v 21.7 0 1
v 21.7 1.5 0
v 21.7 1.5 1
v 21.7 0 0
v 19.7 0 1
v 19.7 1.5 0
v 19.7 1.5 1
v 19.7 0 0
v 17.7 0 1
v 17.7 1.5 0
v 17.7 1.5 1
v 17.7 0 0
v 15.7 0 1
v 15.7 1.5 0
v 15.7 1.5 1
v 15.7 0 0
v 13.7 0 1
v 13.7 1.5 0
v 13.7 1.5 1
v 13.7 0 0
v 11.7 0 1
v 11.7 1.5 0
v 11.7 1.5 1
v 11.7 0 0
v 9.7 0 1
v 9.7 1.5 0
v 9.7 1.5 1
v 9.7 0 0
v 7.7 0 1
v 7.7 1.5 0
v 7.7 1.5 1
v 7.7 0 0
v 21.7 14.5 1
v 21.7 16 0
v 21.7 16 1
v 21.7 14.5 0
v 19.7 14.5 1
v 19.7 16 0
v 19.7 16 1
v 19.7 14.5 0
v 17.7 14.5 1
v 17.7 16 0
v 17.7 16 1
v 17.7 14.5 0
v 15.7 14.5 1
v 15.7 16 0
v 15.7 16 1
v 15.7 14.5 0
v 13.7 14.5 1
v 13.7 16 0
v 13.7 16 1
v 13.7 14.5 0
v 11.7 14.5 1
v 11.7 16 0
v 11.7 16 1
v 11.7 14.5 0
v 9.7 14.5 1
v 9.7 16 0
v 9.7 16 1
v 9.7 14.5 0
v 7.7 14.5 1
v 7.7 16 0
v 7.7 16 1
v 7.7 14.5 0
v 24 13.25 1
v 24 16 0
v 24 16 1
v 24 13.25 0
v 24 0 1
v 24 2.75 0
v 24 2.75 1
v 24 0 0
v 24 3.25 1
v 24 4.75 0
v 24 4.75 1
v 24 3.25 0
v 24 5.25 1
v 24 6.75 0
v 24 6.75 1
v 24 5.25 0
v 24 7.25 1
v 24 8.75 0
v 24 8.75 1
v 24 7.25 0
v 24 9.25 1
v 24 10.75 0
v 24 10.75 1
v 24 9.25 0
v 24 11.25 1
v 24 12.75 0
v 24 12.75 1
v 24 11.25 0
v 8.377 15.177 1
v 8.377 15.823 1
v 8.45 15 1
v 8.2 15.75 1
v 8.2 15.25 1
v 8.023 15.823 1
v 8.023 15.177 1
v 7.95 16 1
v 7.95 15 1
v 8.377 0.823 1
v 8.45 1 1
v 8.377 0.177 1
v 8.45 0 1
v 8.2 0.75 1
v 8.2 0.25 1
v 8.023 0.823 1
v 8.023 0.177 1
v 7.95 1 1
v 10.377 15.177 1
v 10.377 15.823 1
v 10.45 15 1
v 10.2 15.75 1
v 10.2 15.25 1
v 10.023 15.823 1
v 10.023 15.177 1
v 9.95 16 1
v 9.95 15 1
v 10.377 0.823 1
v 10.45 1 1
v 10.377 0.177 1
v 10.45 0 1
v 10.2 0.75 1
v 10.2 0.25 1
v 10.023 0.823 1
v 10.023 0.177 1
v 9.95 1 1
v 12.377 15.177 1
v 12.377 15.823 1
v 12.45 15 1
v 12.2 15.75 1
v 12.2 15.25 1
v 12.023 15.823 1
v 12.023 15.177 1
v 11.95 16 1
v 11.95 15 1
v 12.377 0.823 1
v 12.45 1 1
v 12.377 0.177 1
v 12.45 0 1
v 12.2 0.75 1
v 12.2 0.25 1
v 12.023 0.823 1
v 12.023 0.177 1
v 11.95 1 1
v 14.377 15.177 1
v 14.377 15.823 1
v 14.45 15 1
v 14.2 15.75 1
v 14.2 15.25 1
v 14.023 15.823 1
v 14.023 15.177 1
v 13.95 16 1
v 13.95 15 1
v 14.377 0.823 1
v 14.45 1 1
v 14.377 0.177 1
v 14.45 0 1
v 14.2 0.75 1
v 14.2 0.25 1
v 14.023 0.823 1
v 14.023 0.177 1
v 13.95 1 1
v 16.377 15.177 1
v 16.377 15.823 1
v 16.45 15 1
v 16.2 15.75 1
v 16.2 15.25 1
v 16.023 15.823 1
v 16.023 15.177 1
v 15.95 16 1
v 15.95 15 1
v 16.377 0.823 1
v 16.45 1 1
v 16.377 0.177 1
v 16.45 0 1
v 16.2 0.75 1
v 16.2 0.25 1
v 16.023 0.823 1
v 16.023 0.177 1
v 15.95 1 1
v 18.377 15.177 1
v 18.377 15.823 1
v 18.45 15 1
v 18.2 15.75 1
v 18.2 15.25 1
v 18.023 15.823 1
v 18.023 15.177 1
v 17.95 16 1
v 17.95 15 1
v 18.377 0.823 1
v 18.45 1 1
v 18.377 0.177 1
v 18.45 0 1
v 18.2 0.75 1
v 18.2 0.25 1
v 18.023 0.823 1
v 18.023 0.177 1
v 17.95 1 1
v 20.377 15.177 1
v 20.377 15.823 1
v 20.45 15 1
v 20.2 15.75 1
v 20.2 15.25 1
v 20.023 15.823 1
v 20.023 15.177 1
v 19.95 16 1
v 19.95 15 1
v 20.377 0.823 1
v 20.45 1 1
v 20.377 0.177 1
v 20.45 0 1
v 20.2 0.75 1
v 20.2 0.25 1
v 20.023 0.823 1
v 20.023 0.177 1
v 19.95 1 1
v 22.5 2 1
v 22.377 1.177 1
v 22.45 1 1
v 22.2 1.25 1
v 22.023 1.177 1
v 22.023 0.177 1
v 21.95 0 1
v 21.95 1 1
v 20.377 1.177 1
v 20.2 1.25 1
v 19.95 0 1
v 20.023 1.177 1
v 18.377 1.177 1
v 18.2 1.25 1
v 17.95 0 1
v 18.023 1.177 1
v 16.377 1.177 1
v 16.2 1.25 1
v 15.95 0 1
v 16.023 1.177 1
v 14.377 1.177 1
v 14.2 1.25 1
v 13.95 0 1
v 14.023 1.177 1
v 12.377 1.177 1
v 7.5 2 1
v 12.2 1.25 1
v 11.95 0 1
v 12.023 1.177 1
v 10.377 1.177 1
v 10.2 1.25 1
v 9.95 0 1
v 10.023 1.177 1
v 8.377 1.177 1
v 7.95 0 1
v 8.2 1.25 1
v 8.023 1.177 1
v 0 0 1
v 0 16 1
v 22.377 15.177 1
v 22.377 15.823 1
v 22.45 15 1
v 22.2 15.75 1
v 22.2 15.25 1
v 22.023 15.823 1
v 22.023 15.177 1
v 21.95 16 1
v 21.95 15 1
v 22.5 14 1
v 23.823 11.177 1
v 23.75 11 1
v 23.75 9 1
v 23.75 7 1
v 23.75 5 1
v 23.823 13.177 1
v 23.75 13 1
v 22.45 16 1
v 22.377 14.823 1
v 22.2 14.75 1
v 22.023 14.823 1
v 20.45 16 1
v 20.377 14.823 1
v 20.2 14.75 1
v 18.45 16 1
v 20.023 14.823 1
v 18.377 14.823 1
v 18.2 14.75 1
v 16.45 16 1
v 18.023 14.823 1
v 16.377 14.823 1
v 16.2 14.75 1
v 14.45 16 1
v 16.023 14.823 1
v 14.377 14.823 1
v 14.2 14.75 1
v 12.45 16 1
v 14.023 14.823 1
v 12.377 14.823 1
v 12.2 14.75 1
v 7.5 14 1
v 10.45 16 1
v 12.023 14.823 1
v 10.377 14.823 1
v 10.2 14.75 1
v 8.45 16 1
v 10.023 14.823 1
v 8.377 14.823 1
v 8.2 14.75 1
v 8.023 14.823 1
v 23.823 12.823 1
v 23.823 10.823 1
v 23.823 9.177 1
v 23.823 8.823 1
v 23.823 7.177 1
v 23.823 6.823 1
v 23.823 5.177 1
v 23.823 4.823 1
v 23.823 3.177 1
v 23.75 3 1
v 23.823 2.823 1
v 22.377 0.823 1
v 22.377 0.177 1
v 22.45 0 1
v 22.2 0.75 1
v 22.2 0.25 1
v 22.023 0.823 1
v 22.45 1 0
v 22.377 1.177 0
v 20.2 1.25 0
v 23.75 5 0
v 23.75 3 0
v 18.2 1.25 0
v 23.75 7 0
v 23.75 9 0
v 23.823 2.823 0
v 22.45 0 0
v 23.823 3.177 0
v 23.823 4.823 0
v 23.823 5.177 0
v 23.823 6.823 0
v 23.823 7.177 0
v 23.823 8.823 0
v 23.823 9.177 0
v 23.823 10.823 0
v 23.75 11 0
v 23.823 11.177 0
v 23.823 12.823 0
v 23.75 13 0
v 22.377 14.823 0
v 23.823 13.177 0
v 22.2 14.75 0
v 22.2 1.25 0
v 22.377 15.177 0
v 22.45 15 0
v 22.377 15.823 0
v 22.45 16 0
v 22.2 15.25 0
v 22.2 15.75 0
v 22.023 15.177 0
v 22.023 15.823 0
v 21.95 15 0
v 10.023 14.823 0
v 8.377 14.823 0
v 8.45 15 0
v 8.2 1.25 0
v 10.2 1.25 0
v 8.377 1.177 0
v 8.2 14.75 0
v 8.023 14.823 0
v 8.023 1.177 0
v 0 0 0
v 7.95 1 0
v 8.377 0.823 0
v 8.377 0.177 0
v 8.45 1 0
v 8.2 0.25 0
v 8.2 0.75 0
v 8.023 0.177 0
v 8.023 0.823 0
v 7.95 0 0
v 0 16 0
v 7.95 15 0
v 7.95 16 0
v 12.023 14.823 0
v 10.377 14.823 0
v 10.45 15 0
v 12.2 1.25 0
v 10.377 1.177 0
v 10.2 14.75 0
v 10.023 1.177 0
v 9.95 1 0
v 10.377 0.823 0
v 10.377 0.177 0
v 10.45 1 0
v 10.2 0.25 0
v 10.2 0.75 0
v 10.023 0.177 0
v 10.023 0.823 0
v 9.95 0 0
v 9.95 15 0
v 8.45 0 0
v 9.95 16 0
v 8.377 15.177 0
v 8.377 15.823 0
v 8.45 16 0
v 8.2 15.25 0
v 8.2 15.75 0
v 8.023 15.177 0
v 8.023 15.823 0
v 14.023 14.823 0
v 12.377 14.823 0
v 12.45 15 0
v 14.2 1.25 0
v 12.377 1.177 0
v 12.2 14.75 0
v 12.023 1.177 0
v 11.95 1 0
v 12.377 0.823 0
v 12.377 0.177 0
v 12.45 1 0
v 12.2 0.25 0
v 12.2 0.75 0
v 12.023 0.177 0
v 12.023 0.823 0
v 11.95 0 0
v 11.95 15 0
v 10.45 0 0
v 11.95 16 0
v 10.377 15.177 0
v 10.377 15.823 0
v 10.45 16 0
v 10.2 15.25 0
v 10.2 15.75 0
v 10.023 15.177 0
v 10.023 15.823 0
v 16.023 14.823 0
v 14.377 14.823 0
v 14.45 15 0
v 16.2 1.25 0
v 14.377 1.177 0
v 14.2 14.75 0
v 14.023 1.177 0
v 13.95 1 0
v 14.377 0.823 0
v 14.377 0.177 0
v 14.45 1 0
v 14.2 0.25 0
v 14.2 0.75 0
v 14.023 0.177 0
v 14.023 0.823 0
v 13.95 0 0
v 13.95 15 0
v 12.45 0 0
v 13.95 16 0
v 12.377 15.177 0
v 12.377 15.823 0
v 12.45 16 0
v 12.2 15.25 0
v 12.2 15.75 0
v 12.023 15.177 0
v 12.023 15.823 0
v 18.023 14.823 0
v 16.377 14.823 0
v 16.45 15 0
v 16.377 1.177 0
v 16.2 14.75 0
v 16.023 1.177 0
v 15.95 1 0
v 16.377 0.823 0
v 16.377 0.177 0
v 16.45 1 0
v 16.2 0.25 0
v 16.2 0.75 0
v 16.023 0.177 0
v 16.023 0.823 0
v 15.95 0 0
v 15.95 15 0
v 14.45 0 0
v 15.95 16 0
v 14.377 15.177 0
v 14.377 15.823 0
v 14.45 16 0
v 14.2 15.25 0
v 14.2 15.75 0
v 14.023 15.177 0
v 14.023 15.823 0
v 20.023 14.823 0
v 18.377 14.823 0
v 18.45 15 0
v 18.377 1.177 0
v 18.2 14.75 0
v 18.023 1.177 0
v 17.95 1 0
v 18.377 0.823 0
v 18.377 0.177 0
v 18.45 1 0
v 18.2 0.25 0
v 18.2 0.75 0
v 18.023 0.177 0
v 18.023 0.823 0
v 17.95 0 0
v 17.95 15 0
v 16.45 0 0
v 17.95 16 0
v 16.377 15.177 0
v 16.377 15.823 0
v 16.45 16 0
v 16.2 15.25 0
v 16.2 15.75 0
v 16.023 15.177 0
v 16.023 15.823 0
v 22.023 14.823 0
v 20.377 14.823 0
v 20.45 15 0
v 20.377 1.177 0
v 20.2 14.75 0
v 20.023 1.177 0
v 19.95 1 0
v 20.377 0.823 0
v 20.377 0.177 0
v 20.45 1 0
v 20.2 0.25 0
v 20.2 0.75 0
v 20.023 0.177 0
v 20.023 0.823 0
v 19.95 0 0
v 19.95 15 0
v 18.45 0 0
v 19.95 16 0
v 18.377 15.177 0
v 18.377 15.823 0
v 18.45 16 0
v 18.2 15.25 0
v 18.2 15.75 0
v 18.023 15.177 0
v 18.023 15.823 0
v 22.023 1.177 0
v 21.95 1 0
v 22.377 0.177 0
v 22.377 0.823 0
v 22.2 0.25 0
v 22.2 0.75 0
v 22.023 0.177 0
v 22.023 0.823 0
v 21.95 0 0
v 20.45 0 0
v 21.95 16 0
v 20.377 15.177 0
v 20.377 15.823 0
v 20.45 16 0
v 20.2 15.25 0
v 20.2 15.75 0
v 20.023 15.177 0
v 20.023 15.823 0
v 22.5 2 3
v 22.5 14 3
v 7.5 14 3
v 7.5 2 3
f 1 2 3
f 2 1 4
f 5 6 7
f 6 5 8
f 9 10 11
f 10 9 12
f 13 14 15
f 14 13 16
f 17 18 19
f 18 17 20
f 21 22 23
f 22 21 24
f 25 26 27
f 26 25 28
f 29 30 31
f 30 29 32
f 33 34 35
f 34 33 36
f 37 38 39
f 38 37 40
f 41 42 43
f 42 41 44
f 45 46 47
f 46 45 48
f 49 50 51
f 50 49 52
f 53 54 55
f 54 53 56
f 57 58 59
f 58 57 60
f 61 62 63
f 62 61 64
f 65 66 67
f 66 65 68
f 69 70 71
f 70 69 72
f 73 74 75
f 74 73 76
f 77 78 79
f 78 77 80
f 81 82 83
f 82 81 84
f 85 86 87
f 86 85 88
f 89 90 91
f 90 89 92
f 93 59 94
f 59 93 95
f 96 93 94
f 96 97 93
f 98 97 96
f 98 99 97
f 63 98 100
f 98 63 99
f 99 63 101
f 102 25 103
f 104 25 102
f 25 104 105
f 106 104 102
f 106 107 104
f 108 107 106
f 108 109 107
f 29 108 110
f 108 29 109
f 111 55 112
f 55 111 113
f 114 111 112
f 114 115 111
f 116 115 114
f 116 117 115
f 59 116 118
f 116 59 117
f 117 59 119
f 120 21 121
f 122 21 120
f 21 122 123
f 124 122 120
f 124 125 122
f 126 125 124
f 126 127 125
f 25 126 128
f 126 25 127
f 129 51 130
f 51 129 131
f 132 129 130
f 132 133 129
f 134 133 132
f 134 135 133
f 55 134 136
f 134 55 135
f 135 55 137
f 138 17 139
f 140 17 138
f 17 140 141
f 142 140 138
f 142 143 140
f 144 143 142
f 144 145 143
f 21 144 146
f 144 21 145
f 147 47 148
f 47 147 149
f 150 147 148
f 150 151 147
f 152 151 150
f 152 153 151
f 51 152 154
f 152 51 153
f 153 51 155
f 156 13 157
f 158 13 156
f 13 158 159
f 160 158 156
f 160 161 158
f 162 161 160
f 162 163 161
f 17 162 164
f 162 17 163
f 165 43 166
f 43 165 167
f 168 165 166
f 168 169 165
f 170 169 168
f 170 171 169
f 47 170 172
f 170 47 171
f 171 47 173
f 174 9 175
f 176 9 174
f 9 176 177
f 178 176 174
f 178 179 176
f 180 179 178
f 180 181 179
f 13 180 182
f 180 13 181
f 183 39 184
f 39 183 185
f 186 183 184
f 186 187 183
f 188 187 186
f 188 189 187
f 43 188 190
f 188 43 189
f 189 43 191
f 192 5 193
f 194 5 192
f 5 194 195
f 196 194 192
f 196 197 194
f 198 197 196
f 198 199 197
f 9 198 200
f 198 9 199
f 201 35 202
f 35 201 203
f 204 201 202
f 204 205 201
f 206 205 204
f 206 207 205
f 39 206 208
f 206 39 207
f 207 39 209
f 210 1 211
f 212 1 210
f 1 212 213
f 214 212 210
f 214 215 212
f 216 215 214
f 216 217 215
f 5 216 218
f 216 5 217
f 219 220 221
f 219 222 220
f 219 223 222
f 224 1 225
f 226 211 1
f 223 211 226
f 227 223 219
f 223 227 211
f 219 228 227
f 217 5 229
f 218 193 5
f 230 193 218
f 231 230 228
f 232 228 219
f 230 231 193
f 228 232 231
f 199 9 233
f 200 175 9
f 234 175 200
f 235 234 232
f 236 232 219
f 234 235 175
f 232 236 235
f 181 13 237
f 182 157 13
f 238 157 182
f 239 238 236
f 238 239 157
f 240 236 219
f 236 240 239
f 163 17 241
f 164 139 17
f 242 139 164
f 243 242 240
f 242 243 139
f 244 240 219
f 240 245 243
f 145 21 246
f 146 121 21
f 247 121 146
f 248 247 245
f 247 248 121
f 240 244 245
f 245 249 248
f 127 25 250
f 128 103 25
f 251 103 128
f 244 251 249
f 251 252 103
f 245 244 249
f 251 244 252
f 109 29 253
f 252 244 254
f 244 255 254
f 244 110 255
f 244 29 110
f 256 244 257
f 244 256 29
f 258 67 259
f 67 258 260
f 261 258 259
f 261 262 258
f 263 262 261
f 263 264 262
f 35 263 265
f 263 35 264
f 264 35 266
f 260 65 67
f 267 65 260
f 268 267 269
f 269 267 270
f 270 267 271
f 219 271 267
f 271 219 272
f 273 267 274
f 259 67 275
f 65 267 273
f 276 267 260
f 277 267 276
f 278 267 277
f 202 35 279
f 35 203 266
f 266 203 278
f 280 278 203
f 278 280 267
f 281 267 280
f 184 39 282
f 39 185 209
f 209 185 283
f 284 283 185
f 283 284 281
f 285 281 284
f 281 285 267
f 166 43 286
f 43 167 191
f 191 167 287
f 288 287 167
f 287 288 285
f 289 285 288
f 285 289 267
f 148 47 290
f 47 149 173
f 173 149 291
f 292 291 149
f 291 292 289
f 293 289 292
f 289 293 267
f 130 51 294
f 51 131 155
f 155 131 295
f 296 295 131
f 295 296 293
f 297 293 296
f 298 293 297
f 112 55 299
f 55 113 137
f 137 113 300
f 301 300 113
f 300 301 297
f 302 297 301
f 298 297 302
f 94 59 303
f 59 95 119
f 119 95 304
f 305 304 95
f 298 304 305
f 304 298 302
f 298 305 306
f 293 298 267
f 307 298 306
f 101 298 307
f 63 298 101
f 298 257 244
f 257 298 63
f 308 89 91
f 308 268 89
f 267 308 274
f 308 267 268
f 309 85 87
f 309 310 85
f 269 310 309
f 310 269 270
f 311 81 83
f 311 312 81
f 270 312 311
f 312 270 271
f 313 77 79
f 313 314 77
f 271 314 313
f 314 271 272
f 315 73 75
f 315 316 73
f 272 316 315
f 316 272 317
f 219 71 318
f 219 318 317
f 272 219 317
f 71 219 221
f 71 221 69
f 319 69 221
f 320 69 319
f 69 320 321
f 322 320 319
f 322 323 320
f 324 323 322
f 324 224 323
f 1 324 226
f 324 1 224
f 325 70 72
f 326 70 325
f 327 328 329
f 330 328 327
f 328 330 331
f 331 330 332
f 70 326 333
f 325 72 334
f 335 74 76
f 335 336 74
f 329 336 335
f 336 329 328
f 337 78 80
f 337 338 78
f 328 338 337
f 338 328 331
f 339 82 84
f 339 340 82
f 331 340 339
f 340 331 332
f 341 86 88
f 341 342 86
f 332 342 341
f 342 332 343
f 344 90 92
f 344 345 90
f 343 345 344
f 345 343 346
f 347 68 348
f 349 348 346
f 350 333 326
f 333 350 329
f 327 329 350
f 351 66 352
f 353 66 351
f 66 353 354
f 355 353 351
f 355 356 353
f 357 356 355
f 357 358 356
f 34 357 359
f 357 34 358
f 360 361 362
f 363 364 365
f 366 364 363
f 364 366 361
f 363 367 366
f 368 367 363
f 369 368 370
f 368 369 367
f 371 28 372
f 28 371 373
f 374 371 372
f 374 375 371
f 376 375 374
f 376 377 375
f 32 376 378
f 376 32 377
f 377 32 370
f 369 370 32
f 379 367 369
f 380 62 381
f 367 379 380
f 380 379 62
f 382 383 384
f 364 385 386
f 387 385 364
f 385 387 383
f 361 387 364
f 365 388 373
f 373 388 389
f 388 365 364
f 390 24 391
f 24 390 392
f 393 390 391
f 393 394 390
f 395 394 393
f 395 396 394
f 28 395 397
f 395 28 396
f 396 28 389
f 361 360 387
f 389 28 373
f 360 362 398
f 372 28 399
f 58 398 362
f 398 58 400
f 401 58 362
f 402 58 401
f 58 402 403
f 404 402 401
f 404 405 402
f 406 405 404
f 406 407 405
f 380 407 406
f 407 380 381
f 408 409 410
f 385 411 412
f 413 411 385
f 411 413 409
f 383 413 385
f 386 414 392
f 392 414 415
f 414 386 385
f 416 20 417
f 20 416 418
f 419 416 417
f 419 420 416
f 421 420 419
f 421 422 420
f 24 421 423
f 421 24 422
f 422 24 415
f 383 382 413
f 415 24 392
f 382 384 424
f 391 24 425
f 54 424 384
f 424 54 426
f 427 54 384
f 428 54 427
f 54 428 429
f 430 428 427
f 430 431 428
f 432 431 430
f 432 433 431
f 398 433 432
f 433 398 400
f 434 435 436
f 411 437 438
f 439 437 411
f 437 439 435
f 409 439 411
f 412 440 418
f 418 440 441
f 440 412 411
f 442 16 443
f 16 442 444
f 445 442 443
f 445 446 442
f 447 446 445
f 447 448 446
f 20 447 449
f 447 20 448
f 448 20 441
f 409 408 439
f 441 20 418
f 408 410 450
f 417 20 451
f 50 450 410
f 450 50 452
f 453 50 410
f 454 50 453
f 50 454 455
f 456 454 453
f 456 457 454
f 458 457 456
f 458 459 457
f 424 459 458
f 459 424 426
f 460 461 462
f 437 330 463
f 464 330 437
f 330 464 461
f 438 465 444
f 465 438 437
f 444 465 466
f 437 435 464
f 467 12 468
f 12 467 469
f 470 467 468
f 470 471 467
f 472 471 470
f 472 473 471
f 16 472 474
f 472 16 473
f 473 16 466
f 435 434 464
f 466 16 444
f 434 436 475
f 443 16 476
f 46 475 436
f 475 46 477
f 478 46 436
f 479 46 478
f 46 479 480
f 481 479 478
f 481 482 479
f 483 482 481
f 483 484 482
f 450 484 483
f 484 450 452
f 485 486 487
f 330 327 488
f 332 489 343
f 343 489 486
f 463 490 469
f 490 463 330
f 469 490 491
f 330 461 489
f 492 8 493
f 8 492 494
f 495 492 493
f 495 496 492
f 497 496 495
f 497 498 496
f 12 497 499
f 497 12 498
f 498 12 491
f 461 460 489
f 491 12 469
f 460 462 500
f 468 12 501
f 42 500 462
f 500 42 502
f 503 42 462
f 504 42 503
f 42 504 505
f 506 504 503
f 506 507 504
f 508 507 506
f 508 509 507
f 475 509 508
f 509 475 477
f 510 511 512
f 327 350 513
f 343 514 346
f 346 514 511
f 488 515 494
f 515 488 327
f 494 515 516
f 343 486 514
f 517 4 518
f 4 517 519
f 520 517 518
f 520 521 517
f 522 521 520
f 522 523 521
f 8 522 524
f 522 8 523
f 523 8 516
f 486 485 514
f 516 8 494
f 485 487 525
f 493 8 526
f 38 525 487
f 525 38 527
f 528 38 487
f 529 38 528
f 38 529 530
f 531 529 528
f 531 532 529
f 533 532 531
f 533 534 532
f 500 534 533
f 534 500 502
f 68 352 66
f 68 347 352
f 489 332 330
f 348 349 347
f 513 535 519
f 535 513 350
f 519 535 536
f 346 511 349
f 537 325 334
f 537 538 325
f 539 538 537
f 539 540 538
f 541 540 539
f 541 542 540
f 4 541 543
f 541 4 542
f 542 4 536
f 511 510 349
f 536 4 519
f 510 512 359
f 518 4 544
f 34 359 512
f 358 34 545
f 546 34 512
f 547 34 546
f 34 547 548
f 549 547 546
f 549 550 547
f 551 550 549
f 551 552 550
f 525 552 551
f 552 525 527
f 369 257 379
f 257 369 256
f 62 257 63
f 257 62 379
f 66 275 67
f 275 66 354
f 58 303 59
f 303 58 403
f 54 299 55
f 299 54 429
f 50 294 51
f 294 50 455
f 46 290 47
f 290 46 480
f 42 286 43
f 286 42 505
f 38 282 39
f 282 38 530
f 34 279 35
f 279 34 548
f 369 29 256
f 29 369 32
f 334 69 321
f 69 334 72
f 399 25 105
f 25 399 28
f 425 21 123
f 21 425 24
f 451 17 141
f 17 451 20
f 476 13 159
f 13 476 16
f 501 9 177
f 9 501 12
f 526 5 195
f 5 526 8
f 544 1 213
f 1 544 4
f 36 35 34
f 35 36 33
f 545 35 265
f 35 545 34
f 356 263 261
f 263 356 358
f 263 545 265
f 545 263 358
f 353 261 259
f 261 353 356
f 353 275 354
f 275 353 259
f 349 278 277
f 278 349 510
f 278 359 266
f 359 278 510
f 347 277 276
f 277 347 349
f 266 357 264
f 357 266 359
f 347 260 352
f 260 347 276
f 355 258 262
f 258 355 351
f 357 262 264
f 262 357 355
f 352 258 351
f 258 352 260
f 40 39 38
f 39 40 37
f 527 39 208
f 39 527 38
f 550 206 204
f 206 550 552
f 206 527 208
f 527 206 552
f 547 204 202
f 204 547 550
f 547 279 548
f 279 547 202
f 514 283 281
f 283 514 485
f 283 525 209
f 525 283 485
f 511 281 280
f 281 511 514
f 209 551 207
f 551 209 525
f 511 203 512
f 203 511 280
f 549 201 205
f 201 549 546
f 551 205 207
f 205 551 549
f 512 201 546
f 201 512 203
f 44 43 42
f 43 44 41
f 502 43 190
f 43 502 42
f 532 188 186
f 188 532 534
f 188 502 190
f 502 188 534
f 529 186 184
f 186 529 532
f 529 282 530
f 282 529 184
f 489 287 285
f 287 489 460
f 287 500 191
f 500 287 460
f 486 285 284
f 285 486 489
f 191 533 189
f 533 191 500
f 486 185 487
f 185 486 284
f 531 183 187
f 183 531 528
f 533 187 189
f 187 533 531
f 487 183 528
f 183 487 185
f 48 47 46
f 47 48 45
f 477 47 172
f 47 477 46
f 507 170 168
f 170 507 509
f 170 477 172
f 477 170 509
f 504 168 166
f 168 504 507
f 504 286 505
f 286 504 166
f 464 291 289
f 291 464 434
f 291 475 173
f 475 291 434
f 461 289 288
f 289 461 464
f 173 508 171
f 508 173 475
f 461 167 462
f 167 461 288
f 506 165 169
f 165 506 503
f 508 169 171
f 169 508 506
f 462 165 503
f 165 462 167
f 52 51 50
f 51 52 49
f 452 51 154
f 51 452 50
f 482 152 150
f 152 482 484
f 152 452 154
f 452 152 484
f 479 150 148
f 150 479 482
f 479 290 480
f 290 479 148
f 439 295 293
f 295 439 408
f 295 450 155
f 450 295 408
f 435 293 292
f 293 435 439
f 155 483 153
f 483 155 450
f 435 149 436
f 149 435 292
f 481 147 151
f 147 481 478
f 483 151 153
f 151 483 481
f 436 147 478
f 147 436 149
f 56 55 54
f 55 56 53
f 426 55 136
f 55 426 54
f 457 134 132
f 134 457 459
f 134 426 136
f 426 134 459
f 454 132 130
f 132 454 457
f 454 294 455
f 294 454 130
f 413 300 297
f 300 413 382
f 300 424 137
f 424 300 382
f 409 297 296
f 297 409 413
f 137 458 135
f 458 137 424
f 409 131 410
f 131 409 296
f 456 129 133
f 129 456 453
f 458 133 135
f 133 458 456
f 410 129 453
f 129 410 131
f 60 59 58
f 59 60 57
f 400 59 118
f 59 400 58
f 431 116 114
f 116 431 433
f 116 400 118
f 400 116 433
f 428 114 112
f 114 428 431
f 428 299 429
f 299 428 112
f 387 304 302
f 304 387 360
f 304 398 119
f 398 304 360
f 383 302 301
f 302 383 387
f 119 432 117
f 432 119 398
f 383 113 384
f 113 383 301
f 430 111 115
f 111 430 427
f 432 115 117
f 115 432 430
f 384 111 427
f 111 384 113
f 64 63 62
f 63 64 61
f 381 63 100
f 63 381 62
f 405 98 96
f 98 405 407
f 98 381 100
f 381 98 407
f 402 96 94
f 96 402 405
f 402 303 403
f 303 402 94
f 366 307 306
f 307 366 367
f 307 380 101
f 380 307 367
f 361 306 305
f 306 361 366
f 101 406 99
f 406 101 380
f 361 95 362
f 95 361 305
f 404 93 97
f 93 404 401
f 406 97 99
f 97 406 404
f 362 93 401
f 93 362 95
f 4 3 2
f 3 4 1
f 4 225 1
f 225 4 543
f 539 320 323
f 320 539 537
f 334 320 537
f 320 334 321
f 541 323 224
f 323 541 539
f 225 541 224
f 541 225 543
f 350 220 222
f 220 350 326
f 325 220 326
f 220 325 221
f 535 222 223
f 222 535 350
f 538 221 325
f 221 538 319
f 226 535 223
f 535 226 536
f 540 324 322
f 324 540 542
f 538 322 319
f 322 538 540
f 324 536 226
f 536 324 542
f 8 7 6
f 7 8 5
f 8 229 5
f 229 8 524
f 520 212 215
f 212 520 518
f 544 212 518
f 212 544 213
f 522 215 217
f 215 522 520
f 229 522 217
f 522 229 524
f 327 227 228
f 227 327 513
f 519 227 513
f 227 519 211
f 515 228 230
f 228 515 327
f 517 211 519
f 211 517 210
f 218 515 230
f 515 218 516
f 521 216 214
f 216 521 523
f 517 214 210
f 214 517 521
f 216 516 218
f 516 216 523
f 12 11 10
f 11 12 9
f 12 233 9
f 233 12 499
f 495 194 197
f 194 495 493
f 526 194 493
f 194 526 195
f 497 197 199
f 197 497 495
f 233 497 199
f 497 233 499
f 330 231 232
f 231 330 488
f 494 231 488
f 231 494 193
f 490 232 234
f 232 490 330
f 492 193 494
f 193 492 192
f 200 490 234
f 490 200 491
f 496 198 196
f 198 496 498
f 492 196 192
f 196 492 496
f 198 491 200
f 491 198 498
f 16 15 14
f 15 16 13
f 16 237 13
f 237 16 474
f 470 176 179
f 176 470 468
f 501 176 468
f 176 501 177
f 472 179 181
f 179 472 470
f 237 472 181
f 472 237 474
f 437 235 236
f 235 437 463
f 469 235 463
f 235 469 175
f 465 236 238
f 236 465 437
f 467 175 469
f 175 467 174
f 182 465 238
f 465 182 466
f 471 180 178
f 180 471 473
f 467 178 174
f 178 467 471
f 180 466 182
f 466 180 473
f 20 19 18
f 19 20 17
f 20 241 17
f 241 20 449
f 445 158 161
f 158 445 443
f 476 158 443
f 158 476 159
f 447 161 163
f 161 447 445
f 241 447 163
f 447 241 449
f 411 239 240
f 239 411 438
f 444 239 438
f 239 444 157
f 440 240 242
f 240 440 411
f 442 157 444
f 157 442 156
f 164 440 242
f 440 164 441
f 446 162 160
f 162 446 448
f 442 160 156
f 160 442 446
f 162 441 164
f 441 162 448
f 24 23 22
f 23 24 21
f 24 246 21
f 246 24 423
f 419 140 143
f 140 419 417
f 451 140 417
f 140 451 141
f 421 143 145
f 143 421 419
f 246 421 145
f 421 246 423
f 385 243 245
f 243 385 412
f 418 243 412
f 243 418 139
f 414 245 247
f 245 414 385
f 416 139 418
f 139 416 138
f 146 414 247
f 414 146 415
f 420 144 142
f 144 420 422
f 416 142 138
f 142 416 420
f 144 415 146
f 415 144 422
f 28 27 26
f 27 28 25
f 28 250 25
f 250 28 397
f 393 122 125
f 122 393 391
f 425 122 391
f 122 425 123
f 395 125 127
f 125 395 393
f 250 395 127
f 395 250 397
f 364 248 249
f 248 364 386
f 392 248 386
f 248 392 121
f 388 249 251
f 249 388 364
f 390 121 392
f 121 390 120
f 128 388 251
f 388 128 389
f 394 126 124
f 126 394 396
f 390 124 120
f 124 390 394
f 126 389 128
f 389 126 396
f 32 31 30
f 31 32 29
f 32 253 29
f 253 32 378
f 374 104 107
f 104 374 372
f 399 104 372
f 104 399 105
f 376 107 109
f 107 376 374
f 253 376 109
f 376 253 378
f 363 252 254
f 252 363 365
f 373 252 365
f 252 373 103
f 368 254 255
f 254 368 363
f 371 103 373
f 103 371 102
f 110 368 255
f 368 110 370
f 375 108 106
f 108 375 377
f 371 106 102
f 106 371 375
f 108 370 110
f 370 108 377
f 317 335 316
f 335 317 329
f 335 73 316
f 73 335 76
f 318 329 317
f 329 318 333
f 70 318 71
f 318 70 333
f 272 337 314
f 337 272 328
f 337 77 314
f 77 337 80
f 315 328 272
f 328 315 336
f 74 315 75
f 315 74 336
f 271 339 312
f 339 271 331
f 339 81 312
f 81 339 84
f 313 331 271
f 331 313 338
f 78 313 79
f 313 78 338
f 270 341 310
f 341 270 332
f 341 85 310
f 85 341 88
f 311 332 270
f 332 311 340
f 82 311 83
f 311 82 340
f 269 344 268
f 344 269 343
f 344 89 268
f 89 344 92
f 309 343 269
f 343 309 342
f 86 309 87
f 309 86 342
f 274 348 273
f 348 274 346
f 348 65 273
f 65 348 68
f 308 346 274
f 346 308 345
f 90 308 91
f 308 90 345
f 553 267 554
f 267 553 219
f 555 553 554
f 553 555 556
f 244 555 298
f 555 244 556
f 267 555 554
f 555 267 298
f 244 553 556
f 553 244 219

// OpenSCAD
module esp12e() {
     module pad() {
	  difference() {
	       cube([1,1.5,1]);
	       translate([0.5,0,-1])
		    cylinder(d=0.5,h=3,$fn=8);
	       translate([0.5,1,-1])
		    cylinder(d=0.5,h=3,$fn=8);
	  }
     }

     module endpad() {
	  difference() {
	       cube([1,1.0,1]);
	       translate([0.5,0,-1])
		    cylinder(d=0.5,h=3,$fn=8);
	  }
     }

     difference() {
	  color("blue") cube([24,16,1]);
	  for (j=[0:1])
	       translate([0,j*(16-1.5+0.5),0])
		    union() {
		    for (i=[0:7])
			 translate([24-1.8-0.5-2*i,-0.5,-1]) cube([1,2,3]);
	       }
	  for (i=[0:5])
	       translate([25,2.5+2*i,-1])
		    rotate(90,[0,0,1])
		    cube([1,2,3]);
     }


     translate([0,0,0])
	  union() {
	  for (i=[0:7])
	       translate([1+24-1.8-0.5-2*i,16,0])
		    rotate(180,[0,0,1])
		    pad();
	  for (i=[0:7])
	       translate([24-1.8-0.5-2*i,0,]) pad();
	  for (i=[0:5])
	       translate([24,2.5+2*i,0])
		    rotate(90,[0,0,1])
		    endpad();
     }

     color("silver")
	  translate([7.5,2,1]) cube([15,12,2]);
}

esp12e();
